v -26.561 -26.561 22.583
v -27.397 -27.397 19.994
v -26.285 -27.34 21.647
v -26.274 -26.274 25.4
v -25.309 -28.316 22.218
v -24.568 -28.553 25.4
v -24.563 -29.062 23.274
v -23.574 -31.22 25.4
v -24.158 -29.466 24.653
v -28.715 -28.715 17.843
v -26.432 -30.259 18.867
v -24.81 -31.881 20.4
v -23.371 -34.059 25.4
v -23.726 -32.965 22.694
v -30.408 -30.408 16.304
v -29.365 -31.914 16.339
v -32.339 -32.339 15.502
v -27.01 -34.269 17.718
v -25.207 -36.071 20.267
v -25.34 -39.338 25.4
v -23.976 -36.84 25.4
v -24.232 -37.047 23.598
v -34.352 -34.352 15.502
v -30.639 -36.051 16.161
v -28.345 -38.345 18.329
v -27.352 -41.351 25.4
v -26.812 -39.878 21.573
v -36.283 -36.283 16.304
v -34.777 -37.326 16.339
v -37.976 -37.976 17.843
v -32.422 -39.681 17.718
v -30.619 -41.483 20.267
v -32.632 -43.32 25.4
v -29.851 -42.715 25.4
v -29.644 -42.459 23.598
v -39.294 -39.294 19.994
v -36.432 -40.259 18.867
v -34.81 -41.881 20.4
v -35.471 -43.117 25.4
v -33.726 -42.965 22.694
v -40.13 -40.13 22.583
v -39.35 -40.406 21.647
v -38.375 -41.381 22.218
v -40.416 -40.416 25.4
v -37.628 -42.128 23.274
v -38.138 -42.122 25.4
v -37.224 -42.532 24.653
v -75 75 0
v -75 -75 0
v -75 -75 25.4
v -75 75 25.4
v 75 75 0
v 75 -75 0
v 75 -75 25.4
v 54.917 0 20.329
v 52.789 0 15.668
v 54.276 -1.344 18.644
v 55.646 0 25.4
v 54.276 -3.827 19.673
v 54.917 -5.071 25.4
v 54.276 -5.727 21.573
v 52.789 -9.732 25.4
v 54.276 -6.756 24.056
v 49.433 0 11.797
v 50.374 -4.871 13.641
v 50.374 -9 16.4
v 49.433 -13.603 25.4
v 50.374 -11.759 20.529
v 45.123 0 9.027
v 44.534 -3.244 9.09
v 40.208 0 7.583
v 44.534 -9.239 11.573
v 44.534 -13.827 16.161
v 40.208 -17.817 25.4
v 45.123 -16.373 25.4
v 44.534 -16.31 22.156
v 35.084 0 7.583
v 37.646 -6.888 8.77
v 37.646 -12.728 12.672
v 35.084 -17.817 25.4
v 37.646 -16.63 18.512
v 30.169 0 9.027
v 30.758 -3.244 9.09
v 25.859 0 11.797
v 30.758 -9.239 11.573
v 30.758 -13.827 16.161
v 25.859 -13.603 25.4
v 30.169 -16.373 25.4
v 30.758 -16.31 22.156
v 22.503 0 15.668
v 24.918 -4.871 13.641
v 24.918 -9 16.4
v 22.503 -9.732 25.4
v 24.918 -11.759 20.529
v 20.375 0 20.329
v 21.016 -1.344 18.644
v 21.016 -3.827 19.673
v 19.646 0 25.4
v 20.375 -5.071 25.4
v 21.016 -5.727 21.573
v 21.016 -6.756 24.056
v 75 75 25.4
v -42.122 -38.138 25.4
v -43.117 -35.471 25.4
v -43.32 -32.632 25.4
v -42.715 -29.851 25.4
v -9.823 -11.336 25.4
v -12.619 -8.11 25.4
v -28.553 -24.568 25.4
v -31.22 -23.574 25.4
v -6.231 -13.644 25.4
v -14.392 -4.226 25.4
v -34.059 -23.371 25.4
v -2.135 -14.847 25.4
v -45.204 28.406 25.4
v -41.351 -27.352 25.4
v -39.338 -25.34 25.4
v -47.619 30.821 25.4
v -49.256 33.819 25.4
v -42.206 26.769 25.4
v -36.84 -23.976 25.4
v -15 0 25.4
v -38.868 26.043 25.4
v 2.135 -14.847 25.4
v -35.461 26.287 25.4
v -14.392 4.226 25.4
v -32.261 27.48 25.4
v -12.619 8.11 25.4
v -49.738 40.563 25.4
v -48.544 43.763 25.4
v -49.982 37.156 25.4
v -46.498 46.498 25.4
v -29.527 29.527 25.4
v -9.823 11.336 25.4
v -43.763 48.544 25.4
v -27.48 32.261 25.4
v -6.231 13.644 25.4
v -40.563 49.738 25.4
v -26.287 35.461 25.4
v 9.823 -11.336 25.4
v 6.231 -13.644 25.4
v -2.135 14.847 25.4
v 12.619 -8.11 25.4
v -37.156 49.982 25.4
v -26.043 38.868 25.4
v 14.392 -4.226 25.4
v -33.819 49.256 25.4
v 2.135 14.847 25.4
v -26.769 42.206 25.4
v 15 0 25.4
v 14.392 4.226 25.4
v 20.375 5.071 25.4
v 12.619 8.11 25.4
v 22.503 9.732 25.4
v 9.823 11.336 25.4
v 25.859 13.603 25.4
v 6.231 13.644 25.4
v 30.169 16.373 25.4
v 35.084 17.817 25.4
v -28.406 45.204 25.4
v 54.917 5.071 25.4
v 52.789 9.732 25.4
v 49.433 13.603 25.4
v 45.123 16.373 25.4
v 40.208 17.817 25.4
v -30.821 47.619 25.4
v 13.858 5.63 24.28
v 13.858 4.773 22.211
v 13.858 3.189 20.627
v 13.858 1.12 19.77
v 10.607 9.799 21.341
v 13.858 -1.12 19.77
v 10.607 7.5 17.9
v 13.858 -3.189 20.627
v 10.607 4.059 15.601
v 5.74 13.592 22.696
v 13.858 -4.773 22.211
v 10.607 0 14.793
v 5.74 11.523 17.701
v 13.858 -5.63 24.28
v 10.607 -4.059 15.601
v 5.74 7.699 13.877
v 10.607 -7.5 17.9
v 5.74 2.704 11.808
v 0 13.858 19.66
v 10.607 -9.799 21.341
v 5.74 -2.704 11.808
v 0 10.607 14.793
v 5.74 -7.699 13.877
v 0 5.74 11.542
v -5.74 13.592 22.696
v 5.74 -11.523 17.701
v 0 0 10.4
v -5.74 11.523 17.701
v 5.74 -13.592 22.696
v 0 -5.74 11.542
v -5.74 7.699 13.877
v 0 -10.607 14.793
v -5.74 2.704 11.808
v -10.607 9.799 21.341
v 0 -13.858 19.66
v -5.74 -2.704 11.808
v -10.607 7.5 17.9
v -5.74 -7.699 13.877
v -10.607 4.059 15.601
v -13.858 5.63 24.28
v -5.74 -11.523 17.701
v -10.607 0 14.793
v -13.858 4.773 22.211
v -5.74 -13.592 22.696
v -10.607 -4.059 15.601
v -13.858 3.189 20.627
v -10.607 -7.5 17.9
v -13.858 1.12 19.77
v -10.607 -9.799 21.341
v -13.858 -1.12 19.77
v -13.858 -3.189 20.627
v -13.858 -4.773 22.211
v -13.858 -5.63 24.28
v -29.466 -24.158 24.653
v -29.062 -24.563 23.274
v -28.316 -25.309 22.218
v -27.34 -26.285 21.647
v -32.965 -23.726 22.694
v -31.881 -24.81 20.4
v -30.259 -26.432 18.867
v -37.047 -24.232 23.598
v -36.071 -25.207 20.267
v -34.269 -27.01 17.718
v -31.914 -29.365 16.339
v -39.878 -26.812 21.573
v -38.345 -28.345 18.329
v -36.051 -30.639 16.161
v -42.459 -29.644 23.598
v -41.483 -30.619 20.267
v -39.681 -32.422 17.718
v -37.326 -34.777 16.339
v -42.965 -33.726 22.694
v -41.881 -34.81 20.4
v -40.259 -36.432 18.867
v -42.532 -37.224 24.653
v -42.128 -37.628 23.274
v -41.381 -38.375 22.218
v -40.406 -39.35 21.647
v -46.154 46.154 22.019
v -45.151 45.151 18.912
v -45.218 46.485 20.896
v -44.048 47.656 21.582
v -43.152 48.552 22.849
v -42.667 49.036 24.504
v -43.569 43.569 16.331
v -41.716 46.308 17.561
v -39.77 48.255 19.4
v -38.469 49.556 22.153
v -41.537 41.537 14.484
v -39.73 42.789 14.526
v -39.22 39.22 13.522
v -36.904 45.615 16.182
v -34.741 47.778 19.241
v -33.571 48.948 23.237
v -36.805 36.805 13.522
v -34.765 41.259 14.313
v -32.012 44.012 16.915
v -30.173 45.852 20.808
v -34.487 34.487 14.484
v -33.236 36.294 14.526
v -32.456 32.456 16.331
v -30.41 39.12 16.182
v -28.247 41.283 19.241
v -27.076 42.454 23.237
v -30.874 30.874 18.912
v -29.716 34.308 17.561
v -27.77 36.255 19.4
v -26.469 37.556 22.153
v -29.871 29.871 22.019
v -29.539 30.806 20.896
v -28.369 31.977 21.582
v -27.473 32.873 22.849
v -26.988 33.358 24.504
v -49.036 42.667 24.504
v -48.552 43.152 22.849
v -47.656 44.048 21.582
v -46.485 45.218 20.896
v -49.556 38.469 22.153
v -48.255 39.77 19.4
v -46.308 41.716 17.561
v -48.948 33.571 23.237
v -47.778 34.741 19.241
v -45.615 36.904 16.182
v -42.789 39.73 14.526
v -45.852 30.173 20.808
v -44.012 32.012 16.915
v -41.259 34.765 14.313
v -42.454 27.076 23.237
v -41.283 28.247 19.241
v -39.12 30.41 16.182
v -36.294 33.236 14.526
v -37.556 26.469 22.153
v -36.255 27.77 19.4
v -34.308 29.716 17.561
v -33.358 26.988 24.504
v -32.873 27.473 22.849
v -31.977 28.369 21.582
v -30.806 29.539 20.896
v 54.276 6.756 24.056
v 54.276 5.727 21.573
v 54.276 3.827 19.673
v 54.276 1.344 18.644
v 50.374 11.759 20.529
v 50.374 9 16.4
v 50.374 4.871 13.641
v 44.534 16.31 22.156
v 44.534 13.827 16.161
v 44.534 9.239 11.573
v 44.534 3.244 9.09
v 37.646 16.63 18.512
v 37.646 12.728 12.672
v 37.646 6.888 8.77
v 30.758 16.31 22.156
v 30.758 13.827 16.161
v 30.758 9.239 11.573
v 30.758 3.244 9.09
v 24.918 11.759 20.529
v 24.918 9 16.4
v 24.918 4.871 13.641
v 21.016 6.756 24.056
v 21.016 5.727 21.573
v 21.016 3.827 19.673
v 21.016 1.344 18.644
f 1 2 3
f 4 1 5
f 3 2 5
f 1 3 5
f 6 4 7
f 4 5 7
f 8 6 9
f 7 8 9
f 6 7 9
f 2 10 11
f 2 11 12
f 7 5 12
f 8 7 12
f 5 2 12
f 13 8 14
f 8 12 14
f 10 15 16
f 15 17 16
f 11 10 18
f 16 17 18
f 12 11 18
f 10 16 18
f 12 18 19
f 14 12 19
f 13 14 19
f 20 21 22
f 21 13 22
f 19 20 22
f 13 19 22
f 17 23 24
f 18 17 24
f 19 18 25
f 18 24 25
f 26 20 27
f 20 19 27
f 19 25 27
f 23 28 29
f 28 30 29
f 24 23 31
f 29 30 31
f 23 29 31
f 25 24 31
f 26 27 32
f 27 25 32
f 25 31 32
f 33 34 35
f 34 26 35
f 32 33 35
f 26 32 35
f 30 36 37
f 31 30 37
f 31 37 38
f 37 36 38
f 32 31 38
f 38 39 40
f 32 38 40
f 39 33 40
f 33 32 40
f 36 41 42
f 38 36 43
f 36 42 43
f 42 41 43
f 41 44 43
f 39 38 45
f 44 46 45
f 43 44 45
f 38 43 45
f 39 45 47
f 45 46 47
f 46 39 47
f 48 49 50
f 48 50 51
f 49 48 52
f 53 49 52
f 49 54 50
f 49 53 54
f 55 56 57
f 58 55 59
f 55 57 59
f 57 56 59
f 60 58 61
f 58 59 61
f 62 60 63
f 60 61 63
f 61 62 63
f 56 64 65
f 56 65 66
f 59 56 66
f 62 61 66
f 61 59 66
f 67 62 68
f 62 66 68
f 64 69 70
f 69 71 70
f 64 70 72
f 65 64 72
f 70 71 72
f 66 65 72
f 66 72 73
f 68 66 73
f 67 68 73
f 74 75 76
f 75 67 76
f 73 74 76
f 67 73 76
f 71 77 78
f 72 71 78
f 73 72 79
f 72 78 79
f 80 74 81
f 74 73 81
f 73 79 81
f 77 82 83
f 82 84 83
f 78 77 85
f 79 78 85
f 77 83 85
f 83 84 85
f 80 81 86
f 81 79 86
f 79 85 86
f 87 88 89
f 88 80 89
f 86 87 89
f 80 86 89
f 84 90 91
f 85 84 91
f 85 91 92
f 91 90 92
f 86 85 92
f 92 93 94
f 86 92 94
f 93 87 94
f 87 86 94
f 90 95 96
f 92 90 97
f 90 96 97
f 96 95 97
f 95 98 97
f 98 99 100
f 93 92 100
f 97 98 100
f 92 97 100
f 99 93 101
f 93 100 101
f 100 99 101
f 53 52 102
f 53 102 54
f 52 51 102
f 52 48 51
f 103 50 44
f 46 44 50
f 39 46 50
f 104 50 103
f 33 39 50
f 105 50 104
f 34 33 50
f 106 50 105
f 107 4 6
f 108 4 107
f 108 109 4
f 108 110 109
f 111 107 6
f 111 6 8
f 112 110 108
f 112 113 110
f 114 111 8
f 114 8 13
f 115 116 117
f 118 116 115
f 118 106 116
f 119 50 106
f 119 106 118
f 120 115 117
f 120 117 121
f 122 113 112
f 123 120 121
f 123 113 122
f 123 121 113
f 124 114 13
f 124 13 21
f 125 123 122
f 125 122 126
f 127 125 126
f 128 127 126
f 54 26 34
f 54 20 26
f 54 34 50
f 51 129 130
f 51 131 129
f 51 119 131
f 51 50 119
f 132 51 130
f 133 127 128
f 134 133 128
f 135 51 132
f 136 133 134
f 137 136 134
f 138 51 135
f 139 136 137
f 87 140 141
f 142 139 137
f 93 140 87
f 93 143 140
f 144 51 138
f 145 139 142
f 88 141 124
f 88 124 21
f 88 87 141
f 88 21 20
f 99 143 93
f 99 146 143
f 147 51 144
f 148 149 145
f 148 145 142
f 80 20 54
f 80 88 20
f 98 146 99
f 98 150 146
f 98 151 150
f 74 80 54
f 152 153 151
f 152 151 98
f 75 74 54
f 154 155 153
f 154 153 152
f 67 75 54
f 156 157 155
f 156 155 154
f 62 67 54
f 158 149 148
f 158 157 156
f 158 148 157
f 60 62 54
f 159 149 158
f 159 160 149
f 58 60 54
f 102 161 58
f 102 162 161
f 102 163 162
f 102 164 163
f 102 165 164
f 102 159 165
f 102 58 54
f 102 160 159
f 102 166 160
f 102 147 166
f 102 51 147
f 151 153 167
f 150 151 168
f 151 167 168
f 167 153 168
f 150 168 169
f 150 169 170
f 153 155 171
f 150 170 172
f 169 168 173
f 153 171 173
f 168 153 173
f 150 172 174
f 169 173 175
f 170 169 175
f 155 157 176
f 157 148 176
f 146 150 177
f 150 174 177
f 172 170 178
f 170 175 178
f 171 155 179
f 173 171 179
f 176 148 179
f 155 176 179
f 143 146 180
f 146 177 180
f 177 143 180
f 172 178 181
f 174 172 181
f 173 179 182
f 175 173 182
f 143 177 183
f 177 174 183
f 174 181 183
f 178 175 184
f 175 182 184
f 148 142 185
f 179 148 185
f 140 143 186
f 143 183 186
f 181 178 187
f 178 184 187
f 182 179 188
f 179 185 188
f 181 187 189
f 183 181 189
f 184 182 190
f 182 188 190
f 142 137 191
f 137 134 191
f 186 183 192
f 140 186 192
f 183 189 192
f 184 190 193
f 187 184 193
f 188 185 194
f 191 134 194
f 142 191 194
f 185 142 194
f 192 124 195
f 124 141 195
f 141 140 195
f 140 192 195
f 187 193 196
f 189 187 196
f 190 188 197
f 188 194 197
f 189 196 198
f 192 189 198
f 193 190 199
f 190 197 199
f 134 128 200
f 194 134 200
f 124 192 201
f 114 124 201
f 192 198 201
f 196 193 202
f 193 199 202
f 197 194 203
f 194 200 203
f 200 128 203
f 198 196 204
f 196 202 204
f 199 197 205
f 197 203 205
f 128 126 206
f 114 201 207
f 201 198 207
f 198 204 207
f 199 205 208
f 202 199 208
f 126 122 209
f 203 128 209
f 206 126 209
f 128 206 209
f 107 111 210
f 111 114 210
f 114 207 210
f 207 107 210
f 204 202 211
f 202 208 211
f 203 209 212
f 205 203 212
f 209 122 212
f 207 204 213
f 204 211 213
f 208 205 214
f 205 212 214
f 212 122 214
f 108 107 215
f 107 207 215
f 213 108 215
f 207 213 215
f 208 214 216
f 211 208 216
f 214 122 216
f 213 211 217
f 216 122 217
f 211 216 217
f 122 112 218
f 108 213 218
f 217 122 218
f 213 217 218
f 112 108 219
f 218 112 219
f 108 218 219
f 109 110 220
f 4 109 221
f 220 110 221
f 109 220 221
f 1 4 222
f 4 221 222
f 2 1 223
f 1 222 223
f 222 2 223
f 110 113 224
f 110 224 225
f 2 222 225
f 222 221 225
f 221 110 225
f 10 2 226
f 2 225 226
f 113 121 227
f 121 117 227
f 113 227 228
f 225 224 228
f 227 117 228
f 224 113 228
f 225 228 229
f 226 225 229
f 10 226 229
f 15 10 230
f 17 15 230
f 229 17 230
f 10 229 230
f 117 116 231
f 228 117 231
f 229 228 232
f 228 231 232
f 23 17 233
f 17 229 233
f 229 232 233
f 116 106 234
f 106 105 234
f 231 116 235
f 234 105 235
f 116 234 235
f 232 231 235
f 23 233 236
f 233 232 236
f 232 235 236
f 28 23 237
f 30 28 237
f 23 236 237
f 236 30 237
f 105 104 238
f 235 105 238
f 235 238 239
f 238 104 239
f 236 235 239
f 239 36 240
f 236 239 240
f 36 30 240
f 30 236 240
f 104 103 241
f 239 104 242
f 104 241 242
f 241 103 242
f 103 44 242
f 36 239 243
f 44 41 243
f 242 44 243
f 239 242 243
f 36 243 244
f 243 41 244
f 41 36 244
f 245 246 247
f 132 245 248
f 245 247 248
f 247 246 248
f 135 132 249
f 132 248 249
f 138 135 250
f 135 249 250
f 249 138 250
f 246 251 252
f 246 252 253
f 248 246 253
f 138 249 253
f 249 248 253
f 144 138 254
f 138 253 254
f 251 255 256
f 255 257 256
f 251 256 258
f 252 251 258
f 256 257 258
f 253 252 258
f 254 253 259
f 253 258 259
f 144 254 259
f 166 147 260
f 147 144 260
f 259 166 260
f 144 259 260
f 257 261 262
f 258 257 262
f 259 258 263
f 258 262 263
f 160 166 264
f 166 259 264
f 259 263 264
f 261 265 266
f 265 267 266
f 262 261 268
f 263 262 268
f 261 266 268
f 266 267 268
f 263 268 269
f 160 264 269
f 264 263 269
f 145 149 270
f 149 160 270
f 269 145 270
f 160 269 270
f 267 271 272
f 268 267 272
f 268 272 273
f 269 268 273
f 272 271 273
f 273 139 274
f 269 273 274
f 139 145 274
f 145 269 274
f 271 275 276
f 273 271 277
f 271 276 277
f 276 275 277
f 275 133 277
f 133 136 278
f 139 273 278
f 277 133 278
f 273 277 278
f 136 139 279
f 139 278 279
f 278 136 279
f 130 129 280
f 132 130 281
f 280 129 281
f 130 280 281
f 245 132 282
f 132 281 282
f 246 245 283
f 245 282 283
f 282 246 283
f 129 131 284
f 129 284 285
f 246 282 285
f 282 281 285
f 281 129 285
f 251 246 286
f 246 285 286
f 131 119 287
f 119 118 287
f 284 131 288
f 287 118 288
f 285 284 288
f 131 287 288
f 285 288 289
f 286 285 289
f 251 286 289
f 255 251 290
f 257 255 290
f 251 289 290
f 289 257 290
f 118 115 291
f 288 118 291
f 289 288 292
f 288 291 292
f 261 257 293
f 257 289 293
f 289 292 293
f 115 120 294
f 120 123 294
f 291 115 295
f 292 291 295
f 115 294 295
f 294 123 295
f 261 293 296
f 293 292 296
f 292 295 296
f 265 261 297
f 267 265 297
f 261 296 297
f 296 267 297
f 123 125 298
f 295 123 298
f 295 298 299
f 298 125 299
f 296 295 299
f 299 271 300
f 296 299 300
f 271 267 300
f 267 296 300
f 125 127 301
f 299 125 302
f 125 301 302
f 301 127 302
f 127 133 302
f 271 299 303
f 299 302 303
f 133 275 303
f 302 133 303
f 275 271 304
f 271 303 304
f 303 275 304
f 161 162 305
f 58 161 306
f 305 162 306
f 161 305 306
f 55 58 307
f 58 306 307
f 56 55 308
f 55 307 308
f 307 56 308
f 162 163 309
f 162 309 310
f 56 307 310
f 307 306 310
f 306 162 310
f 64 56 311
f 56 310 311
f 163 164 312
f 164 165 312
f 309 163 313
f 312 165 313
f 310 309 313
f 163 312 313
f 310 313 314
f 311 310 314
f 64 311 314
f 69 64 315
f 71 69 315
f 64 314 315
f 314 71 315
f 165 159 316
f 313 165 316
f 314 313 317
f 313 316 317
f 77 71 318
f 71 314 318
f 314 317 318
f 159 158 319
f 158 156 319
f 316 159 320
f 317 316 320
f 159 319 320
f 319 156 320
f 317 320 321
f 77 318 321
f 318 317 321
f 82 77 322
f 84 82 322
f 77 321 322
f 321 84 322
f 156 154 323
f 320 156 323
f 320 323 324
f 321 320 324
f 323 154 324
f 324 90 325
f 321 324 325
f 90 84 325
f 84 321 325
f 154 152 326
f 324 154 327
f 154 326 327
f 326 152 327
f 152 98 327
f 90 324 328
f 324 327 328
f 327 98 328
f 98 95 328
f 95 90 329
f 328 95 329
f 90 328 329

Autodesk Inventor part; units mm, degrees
sketch "Boceto1" plane through (0, 0, 0) normal (0, 0, 1) x (1, 0, 0)
  line L0 (-75, 75) -> (75, 75)
  line L1 (75, 75) -> (75, -75)
  line L2 (75, -75) -> (-75, -75)
  line L3 (-75, -75) -> (-75, 75)
  line L4 (-75, 75) -> (75, -75) construction
  line L5 (75, 75) -> (-75, -75) construction
  point P0 (0, 0)
  dimension "d0" = 150
  dimension "d1" = 150
extrude "Extrusión1" add sketch "Boceto1" along normal blind 25.4
sketch "Boceto3" plane through (0, 0, 0) normal (0, 1, 0) x (-1, 0, 0)
  line L0 (-75, 25.4) -> (75, 25.4) projected
  arc A0 (-15, 25.4) -> (15, 25.4) centre (0, 25.4) ccw
  line L1 (15, 25.4) -> (-15, 25.4)
  point P0 (0, 0)
  dimension "d7" = 15
revolve "Revolución2" cut sketch "Boceto3" angle 360 about axis through (75, 0, 25.4) along (-1, 0, 0)
ref_plane "Plano de trabajo1" through (-75, -75, 0) normal (-0.7071068, 0.7071068, 0) x (0, 0, 1)
ref_plane "Plano de trabajo2" through (75, -75, 0) normal (-0.7071068, -0.7071068, 0) x (0, 0, 1)
sketch "Boceto4" plane through (-75, -75, 0) normal (-0.7071068, 0.7071068, 0) x (0, 0, 1)
  line L0 (25.4, 106.066) -> (25.4, 0) projected
  arc A0 (25.4, 68.9087) -> (25.4, 48.9087) centre (25.4, 58.9087) ccw
  line L1 (25.4, 48.9087) -> (25.4, 68.9087)
  point P0 (0, 106.066)
  dimension "d11" = 10
sketch "Boceto5" plane through (75, -75, 0) normal (-0.7071068, -0.7071068, 0) x (0, 0, 1)
  line L0 (25.4, 106.066) -> (25.4, 212.132) projected
  arc A0 (25.4, 171.8235) -> (25.4, 147.8235) centre (25.4, 159.8235) ccw
  line L1 (25.4, 171.8235) -> (25.4, 147.8235)
  point P0 (0, 106.066)
  dimension "d12" = 12
sketch "Boceto6" plane through (0, 0, 0) normal (0, 1, 0) x (-1, 0, 0)
  arc A0 (-55.646, 25.4) -> (-19.646, 25.4) centre (-37.646, 25.4) ccw
  line L0 (-19.646, 25.4) -> (-55.646, 25.4)
  line L1 (-75, 25.4) -> (75, 25.4) projected
  point P0 (0, 0)
  dimension "d13" = 18
revolve "Revolución3" cut sketch "Boceto5" angle 360 about axis through (0, 0, 25.4) along (-0.7071068, 0.7071068, 0)
revolve "Revolución4" cut sketch "Boceto4" angle 360 about axis through (0, 0, 25.4) along (-0.7071068, -0.7071068, 0)
revolve "Revolución5" cut sketch "Boceto6" angle 360 about axis through (19.646, 0, 25.4) along (1, 0, 0)
properties part number "Placa - Pitting Esfera"
